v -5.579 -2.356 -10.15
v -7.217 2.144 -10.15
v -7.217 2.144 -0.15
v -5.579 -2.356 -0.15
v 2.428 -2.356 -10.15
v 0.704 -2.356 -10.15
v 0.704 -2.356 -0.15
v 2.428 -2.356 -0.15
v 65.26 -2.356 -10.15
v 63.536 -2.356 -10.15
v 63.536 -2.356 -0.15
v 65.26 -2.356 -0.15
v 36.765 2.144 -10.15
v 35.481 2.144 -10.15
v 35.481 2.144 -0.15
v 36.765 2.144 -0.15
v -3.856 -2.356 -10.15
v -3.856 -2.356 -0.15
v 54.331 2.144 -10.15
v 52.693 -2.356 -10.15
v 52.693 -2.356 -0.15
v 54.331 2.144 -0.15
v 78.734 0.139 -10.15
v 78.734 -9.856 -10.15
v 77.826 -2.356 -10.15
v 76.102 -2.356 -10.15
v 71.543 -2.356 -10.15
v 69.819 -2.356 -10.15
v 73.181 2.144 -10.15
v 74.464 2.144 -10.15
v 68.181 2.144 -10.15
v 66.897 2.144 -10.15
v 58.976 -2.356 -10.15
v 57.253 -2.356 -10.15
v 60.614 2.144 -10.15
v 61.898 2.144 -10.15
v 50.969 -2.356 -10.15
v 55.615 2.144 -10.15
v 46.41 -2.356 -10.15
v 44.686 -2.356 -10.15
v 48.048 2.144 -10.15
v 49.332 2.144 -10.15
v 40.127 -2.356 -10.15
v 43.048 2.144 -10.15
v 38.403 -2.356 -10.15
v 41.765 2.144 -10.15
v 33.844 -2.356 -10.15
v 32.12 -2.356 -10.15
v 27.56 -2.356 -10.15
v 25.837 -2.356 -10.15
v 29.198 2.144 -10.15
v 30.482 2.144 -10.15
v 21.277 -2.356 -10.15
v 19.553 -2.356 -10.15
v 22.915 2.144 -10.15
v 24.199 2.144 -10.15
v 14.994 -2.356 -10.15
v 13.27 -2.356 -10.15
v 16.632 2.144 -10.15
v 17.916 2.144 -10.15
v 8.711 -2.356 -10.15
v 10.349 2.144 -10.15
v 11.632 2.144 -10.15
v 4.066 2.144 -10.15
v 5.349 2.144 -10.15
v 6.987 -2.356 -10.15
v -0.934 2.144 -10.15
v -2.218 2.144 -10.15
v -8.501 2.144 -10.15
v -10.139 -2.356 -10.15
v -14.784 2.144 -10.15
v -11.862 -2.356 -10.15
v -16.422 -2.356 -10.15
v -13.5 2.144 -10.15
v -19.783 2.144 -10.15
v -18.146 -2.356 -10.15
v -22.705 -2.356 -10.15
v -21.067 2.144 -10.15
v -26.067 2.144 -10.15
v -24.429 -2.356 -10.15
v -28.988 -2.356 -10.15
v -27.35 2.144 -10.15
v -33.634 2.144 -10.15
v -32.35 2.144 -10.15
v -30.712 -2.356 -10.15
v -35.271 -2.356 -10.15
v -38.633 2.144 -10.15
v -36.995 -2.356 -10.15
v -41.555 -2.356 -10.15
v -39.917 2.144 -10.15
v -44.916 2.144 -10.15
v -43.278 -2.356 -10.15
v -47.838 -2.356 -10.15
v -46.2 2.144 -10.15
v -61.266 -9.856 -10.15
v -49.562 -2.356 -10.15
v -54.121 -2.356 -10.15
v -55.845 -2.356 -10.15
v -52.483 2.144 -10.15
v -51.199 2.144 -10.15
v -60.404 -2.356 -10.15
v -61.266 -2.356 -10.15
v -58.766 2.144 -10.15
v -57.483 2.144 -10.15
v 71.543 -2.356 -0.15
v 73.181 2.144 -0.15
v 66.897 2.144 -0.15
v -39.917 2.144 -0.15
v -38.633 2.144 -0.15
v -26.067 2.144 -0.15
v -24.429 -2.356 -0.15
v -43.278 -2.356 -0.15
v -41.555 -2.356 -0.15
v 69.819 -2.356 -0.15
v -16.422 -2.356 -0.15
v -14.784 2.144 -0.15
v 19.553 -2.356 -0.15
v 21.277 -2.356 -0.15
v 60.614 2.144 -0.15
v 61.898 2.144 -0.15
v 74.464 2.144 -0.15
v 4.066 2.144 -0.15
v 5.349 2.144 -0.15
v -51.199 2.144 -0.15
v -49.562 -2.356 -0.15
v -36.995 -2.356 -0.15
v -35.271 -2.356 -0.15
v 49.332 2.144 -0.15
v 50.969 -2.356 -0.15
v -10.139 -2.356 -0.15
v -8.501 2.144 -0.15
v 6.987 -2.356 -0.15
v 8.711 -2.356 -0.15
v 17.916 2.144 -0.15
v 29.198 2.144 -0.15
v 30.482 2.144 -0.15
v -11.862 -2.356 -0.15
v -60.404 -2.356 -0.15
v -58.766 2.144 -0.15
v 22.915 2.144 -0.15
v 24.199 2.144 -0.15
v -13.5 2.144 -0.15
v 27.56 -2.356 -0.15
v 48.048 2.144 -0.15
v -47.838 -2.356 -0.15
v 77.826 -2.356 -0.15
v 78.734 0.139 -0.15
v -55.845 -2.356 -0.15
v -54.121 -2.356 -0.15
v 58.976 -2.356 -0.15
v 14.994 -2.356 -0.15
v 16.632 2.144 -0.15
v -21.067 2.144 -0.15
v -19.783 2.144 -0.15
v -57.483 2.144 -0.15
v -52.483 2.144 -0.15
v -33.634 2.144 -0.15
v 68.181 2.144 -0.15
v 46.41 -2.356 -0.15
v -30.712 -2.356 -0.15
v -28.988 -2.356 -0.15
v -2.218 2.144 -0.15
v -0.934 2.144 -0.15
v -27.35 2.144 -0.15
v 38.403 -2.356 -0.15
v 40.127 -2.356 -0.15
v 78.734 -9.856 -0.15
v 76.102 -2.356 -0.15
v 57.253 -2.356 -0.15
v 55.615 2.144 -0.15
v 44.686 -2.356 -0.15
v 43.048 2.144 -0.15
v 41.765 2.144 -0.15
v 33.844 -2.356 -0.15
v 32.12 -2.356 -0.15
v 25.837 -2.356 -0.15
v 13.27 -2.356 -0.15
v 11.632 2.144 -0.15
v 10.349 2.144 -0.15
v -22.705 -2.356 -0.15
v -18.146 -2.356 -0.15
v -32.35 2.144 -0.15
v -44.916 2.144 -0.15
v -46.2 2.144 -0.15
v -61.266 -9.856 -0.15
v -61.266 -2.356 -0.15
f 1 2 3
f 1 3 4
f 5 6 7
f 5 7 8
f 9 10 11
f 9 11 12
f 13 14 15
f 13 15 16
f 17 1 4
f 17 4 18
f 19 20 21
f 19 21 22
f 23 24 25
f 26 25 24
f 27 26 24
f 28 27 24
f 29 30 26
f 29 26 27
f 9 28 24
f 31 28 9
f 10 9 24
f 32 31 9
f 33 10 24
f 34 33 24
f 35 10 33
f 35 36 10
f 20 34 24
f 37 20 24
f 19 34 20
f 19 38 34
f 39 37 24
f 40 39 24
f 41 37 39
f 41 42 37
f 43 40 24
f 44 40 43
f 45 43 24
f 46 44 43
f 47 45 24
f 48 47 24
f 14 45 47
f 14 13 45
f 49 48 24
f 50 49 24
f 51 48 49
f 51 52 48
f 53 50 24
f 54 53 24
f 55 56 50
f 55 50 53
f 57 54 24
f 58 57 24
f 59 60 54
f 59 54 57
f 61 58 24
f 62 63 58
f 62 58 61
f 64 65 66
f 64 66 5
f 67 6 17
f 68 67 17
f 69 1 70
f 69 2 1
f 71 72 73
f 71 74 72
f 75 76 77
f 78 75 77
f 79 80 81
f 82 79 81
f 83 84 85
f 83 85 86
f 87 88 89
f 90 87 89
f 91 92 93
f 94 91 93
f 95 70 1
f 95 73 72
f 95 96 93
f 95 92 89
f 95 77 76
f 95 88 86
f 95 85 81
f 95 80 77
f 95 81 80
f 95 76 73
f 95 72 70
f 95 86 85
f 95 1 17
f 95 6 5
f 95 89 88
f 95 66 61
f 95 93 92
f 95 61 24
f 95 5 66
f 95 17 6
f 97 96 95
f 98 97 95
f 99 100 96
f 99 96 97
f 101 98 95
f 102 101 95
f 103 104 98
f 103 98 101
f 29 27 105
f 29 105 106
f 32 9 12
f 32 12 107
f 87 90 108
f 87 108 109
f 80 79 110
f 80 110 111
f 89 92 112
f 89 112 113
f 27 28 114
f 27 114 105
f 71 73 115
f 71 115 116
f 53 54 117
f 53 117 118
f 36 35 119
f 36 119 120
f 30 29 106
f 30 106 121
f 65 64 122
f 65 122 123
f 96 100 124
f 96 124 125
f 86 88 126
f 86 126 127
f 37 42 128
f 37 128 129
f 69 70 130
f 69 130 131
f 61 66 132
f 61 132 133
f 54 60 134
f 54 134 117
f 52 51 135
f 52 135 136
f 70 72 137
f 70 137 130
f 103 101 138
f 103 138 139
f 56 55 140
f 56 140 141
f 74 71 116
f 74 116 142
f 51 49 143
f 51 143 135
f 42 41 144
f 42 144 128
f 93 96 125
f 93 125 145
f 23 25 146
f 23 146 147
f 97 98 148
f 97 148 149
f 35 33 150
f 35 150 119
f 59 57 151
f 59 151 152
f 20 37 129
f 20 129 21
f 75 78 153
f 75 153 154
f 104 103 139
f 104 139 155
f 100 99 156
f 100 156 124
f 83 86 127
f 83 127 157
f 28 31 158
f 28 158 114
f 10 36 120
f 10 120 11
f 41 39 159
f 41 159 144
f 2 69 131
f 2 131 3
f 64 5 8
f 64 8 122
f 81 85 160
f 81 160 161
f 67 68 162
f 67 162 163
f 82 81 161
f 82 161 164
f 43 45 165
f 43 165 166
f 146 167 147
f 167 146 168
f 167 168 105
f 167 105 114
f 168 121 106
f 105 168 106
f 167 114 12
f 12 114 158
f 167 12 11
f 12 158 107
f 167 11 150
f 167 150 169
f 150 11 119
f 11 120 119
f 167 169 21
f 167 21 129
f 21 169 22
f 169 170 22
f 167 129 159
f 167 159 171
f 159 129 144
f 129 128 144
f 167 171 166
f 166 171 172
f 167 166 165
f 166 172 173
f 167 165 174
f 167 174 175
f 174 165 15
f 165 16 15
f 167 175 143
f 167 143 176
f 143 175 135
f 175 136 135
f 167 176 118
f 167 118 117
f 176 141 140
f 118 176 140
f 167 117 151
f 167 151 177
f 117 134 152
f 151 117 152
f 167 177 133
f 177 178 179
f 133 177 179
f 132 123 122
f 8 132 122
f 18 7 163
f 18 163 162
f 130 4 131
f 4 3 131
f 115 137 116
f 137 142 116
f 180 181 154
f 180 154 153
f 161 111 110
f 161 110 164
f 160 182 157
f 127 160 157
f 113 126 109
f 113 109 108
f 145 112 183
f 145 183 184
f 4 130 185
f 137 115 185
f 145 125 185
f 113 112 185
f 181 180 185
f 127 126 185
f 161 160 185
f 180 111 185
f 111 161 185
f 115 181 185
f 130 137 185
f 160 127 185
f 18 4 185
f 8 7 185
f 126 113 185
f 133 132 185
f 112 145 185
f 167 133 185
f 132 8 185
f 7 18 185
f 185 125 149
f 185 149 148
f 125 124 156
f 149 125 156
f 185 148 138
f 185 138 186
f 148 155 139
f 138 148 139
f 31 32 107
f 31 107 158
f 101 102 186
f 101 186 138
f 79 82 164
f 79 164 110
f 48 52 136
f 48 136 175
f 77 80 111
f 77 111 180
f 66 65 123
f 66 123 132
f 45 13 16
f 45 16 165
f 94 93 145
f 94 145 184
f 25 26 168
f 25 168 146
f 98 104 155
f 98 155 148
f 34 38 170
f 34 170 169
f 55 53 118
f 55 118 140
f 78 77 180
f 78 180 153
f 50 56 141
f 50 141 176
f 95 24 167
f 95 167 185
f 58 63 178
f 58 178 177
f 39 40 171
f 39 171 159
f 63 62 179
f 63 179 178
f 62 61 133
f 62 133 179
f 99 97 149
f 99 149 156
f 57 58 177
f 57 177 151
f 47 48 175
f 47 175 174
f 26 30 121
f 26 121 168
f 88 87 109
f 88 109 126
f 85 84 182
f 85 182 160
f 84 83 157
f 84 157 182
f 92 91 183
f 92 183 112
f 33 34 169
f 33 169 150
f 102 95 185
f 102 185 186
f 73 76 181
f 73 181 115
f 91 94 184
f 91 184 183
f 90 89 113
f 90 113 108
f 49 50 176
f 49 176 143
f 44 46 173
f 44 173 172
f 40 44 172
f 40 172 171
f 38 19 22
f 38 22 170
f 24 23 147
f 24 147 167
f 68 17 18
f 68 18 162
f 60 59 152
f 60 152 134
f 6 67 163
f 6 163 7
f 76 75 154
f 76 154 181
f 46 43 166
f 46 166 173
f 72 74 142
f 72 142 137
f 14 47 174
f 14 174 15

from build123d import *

# Parameters (mm, degrees)
BOSS_EXTRUDE1_DEPTH = 10


with BuildPart() as part:
    # Sketch1 → Boss-Extrude1 (new body)
    with BuildSketch(Plane(origin=(0, 0, -10.149759329), x_dir=(-1, 0, 0), z_dir=(0, 0, -1))):
        Polygon((-74.464294138, 2.144266729), (-76.102160192, -2.355733271), (-77.825901671, -2.355733271), (-78.733954331, 0.13912091), (-78.733954331, -9.855733271), (61.266045669, -9.855733271), (61.266045669, -2.355733271), (60.404174929, -2.355733271), (58.766308875, 2.144266729), (57.482597162, 2.144266729), (55.844731108, -2.355733271), (54.120989629, -2.355733271), (52.483123575, 2.144266729), (51.199411862, 2.144266729), (49.561545808, -2.355733271), (47.837804329, -2.355733271), (46.199938275, 2.144266729), (44.916226562, 2.144266729), (43.278360508, -2.355733271), (41.554619029, -2.355733271), (39.916752975, 2.144266729), (38.633041262, 2.144266729), (36.995175208, -2.355733271), (35.271433729, -2.355733271), (33.633567675, 2.144266729), (32.349855962, 2.144266729), (30.711989908, -2.355733271), (28.988248429, -2.355733271), (27.350382375, 2.144266729), (26.066670662, 2.144266729), (24.428804608, -2.355733271), (22.705063129, -2.355733271), (21.067197075, 2.144266729), (19.783485362, 2.144266729), (18.145619308, -2.355733271), (16.421877829, -2.355733271), (14.784011775, 2.144266729), (13.500300062, 2.144266729), (11.862434008, -2.355733271), (10.138692529, -2.355733271), (8.500826475, 2.144266729), (7.217114762, 2.144266729), (5.579248708, -2.355733271), (3.855507229, -2.355733271), (2.217641175, 2.144266729), (0.933929462, 2.144266729), (-0.703936592, -2.355733271), (-2.427678071, -2.355733271), (-4.065544125, 2.144266729), (-5.349255838, 2.144266729), (-6.987121892, -2.355733271), (-8.710863371, -2.355733271), (-10.348729425, 2.144266729), (-11.632441138, 2.144266729), (-13.270307192, -2.355733271), (-14.994048671, -2.355733271), (-16.631914725, 2.144266729), (-17.915626438, 2.144266729), (-19.553492492, -2.355733271), (-21.277233971, -2.355733271), (-22.915100025, 2.144266729), (-24.198811738, 2.144266729), (-25.836677792, -2.355733271), (-27.560419271, -2.355733271), (-29.198285325, 2.144266729), (-30.481997038, 2.144266729), (-32.119863092, -2.355733271), (-33.843604571, -2.355733271), (-35.481470625, 2.144266729), (-36.765182338, 2.144266729), (-38.403048392, -2.355733271), (-40.126789871, -2.355733271), (-41.764655925, 2.144266729), (-43.048367638, 2.144266729), (-44.686233692, -2.355733271), (-46.409975171, -2.355733271), (-48.047841225, 2.144266729), (-49.331552938, 2.144266729), (-50.969418992, -2.355733271), (-52.693160471, -2.355733271), (-54.331026525, 2.144266729), (-55.614738238, 2.144266729), (-57.252604292, -2.355733271), (-58.976345771, -2.355733271), (-60.614211825, 2.144266729), (-61.897923538, 2.144266729), (-63.535789592, -2.355733271), (-65.259531071, -2.355733271), (-66.897397125, 2.144266729), (-68.181108838, 2.144266729), (-69.818974892, -2.355733271), (-71.542716371, -2.355733271), (-73.180582425, 2.144266729), align=None)
    extrude(amount=-BOSS_EXTRUDE1_DEPTH)


solid = part.part
